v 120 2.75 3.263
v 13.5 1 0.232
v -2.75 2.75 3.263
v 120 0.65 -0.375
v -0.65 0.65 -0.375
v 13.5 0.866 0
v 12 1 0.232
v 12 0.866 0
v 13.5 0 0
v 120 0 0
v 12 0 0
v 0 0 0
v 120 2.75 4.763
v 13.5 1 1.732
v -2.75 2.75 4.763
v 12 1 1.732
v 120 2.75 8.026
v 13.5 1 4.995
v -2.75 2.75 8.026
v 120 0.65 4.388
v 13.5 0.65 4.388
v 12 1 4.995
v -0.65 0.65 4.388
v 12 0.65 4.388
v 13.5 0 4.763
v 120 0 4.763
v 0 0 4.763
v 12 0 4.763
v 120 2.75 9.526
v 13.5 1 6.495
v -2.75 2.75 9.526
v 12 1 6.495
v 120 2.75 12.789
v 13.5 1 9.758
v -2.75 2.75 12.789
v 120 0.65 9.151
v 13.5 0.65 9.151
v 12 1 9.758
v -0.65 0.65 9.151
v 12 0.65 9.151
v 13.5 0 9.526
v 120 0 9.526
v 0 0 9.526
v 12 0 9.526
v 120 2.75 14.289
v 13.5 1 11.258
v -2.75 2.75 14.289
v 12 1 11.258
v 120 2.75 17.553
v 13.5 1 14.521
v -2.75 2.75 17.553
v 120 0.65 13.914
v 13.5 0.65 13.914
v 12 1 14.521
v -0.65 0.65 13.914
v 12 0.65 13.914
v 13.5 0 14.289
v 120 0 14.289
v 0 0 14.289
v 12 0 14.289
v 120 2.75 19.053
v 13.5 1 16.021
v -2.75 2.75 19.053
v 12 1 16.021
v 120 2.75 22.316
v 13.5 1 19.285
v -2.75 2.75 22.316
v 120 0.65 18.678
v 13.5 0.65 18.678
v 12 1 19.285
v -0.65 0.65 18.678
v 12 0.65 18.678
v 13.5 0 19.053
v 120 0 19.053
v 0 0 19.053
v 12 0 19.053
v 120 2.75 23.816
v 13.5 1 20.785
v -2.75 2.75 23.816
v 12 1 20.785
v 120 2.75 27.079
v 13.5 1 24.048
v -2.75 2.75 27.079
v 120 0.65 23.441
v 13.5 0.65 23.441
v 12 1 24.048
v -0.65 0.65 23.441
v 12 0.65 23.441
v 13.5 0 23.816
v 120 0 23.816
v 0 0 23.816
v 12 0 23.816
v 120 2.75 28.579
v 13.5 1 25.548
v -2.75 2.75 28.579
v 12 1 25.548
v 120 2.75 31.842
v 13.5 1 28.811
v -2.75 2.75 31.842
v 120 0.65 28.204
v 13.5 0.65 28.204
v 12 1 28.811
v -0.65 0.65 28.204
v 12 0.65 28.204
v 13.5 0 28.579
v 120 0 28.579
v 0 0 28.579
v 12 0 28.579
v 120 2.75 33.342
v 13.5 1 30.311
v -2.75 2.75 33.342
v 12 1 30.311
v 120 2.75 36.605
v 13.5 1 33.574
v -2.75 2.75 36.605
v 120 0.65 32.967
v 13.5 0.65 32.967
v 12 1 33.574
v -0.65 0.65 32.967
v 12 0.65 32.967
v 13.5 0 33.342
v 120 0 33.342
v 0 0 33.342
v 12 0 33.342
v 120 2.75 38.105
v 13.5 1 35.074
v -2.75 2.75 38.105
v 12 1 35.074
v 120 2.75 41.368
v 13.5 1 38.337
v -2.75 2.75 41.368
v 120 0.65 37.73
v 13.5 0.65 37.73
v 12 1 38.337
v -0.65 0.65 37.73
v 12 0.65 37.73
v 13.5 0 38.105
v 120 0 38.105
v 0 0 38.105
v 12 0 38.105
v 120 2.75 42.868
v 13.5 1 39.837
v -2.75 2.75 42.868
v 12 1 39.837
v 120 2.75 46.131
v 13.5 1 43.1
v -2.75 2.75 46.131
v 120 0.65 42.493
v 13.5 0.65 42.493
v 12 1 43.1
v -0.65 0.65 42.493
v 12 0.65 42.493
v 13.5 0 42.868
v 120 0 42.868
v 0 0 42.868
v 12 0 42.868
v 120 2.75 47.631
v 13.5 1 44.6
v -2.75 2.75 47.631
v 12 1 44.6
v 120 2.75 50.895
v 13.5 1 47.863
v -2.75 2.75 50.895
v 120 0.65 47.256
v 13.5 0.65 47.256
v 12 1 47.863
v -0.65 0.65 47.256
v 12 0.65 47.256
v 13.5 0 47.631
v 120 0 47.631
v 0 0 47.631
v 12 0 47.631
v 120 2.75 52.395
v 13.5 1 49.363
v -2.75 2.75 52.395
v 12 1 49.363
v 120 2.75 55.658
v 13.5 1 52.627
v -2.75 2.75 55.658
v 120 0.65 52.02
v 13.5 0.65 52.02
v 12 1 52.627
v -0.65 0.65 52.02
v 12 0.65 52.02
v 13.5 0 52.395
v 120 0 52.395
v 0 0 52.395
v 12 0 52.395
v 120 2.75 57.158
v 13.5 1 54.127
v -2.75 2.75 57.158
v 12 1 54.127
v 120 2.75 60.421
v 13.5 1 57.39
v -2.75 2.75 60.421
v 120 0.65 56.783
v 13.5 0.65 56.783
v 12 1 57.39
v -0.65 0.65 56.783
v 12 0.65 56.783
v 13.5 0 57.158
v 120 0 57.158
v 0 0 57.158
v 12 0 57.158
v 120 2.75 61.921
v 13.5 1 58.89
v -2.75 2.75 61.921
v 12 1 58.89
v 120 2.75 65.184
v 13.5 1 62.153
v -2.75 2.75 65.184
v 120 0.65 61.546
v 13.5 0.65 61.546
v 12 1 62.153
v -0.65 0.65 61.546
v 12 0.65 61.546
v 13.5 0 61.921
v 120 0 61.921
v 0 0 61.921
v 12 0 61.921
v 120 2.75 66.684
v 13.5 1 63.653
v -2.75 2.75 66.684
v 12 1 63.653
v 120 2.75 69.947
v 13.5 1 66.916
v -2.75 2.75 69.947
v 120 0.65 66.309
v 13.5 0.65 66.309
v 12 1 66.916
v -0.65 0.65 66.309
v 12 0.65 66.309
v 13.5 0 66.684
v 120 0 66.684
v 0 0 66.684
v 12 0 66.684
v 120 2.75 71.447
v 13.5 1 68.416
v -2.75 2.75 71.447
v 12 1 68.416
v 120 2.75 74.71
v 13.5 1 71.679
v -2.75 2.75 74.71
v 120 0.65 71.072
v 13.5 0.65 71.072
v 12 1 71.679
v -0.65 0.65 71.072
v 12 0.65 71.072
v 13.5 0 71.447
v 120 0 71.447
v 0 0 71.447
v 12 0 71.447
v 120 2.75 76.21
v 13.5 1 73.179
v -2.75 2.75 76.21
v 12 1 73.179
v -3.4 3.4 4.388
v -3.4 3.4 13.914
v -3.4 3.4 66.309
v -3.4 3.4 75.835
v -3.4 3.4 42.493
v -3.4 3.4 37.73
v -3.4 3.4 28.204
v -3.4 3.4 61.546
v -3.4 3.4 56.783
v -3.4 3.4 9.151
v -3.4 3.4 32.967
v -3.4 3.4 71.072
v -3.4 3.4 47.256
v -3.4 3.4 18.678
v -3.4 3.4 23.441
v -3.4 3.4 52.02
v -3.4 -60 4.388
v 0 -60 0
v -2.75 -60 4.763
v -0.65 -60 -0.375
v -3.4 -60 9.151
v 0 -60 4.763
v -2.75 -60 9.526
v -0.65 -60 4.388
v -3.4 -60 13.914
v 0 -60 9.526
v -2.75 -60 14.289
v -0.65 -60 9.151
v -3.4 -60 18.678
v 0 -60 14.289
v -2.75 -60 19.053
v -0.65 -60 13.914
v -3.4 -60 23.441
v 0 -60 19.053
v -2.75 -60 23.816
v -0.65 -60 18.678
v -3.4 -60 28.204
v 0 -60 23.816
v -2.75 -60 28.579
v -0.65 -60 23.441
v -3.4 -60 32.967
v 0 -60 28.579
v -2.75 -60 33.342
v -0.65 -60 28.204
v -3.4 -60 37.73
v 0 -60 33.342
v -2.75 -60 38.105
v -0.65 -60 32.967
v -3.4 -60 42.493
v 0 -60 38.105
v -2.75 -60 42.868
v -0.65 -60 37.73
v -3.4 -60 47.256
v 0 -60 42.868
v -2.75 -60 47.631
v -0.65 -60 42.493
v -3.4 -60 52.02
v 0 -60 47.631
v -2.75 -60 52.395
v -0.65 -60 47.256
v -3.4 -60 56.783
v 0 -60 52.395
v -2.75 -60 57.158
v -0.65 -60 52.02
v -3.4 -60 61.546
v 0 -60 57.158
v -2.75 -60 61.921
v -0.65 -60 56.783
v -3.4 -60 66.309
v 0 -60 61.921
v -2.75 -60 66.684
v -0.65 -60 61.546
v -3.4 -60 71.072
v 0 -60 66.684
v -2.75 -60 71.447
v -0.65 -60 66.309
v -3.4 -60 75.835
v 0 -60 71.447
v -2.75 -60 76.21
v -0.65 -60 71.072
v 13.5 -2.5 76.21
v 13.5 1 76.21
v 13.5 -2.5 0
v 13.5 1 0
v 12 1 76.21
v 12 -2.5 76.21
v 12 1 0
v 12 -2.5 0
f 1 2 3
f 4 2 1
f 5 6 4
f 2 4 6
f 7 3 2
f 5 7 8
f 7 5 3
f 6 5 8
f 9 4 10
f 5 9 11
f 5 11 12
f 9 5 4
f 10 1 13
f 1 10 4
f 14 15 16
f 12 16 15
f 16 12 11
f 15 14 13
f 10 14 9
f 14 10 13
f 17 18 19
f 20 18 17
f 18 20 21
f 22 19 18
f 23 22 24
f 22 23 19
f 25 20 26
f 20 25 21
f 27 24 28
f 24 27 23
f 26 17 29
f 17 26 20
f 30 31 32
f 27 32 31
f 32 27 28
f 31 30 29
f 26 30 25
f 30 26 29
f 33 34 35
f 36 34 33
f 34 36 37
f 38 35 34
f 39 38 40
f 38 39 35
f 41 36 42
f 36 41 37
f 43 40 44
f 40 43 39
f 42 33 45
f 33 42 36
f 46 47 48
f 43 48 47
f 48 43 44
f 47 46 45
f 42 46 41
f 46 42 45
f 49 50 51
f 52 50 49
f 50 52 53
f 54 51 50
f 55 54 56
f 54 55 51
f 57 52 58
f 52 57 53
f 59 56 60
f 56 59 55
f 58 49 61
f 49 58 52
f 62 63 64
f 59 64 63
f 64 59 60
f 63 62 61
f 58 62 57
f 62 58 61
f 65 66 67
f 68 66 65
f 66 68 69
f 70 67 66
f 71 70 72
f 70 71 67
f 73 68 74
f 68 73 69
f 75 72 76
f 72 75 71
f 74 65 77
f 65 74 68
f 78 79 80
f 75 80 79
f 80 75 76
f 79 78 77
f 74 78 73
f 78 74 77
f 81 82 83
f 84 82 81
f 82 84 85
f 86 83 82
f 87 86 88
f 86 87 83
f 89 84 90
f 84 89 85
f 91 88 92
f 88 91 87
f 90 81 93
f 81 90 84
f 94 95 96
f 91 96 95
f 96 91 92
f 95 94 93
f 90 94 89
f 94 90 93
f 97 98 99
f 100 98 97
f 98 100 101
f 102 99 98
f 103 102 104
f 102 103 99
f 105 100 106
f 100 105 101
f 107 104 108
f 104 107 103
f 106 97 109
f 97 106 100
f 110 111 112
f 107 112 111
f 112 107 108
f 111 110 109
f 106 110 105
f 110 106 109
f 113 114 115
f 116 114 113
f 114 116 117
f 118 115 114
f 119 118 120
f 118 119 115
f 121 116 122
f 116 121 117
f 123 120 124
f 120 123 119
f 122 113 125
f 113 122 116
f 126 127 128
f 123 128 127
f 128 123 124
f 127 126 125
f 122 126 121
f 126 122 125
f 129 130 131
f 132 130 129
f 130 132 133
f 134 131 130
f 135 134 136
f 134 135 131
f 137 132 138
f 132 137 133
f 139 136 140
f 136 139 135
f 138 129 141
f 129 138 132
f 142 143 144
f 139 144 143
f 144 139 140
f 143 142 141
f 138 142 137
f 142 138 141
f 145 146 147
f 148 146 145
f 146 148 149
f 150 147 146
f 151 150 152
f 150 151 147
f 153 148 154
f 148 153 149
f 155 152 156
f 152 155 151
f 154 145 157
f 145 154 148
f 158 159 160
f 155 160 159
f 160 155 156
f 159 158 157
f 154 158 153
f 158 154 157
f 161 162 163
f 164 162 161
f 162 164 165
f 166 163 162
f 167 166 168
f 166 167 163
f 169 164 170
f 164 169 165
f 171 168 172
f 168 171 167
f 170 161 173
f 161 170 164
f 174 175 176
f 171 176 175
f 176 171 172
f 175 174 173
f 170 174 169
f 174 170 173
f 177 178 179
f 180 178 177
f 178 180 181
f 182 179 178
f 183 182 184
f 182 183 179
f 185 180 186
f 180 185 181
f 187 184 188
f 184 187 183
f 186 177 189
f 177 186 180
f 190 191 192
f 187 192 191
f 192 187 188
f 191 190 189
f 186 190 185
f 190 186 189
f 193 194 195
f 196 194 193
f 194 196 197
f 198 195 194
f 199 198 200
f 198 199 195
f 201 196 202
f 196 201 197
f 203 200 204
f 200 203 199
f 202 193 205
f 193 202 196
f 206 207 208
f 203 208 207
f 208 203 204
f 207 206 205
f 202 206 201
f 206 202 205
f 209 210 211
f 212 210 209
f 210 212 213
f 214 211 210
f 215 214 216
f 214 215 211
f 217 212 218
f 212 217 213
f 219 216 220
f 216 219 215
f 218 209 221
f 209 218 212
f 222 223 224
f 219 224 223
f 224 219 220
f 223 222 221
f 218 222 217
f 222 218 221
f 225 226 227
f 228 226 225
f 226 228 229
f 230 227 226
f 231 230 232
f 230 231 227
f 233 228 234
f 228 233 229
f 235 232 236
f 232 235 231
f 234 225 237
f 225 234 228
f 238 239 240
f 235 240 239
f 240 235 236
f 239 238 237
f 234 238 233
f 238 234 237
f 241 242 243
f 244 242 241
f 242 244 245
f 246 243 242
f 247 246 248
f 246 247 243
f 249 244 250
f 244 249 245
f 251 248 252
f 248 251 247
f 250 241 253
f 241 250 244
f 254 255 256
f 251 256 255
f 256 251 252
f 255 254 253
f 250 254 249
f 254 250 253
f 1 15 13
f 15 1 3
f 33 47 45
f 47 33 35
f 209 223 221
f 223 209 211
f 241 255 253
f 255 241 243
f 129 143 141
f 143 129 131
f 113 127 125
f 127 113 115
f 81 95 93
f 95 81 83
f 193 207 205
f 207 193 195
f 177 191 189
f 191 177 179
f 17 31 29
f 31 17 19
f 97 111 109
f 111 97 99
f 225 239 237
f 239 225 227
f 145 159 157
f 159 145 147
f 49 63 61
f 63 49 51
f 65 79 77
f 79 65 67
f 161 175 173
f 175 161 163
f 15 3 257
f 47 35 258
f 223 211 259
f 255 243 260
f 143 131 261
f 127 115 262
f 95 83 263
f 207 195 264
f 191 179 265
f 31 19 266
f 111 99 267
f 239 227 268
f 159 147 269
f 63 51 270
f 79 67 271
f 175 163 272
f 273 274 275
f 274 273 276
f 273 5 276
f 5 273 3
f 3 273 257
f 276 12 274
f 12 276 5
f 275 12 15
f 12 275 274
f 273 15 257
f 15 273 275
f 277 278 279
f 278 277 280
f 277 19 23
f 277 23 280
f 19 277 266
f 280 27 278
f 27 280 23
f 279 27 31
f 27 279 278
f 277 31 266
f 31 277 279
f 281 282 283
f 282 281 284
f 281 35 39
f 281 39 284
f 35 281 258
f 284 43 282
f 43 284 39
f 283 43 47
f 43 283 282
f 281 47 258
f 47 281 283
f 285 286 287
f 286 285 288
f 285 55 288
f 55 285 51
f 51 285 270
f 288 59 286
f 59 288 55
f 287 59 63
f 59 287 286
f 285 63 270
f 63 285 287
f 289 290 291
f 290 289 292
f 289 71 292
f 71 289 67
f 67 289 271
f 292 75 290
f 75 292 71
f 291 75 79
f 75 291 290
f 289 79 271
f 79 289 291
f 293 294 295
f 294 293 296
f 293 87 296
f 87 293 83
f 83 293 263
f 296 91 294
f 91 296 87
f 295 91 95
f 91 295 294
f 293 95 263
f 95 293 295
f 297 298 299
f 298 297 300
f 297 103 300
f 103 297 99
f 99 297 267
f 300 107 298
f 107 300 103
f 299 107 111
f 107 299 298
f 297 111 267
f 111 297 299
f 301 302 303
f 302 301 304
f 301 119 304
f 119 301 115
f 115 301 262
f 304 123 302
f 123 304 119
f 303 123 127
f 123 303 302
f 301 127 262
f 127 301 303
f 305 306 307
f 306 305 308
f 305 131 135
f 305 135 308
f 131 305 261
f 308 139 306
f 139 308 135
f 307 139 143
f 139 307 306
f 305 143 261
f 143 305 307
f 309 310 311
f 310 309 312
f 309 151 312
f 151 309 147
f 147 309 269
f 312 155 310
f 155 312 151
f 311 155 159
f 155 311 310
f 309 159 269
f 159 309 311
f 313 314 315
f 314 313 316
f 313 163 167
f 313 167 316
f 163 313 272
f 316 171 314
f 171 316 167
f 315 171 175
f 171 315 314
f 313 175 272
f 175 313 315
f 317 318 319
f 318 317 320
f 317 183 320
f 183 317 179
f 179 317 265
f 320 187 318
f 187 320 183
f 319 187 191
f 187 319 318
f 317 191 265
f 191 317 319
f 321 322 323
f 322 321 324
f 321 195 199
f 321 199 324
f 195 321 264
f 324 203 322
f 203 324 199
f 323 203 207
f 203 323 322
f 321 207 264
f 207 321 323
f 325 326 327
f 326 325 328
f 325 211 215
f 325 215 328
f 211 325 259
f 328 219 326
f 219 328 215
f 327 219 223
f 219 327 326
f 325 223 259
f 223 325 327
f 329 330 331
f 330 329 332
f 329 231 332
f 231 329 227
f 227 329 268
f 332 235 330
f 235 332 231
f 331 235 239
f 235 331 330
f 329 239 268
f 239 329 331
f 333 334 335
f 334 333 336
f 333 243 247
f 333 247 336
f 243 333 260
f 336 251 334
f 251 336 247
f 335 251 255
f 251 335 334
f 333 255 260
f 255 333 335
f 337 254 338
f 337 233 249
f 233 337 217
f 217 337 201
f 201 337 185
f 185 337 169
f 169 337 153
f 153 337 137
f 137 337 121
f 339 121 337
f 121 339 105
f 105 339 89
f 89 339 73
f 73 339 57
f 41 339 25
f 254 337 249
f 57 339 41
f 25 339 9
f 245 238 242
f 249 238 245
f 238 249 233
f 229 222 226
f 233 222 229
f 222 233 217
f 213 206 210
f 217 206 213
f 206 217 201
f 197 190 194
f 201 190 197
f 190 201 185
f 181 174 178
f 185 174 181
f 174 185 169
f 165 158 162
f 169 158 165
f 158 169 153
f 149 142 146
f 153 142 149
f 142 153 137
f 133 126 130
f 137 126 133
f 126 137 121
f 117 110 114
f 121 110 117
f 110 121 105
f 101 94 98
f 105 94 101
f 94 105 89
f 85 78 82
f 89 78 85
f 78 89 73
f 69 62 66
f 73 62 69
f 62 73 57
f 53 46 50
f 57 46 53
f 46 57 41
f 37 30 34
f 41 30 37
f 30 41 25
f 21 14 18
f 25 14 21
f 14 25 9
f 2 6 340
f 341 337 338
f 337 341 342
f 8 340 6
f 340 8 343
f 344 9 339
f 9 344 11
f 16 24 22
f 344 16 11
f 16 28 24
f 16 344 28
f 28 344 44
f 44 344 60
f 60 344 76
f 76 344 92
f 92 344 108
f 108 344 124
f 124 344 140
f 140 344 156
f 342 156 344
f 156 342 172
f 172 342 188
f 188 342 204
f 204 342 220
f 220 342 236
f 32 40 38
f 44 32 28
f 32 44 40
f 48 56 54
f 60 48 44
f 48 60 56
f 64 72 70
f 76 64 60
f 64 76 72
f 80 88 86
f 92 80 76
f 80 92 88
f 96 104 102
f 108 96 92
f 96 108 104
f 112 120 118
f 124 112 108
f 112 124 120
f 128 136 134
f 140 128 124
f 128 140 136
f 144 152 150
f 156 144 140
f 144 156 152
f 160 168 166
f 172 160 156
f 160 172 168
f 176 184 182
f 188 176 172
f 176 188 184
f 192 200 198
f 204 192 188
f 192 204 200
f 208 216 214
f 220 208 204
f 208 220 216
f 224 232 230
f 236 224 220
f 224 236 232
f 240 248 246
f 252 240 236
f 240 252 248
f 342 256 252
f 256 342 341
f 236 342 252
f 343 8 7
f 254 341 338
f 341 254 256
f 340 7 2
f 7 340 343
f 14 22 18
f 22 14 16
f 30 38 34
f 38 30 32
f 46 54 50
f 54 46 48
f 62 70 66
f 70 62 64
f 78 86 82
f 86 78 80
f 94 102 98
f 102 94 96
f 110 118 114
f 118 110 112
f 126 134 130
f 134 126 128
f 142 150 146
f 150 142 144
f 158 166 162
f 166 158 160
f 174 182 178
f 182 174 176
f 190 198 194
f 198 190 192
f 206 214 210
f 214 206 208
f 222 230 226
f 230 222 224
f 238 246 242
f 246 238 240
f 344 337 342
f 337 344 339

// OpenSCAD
// file: math.scad
function sum( v, i = 0) = i < len( v) ? v[ i] + sum( v, i + 1) : 0;

function vector_sum( v, i = 0) = i < len( v) - 1 ? let( w = vector_sum( v, i + 1)) [ for ( j = [ 0: len( w) - 1]) v[ i][ j] + w[ j]] : v[ i];
function vector_difference( a, b) = [ for ( i = [ 0: len( a) - 1]) a[ i] - b[ i]];
function vector_length( v) = sqrt( sum( [ for ( i = v) i * i]));
function vector_scale( v, x) = [ for ( i = v) i * x];

function normalize_angle( a) =
        a < -180
        ? normalize_angle( a + 360)
        : ( a > 180
            ? normalize_angle( a - 360)
            : a);

function polar_to_vector( a, m) =
        [ cos( a) * m, sin( a) * m];

function vector_to_angle( v) = atan2( v[ 1], v[ 0]);
function vector_to_polar( v) = [ vector_to_angle( v), vector_length( v)];
// main file
use <math.scad>;

$fn = 12;

function _echo(x,s) = [x, search([str(s)], [])][0];
function _assert(m,x,v) = x?v:_echo(v, str(m));
function _value(n,v) = _echo(v, str(n,"=",v));
function _func(n,a) = _echo(undef, str(n,"(",_args(a),")"));
function _args(a,i=0,s="") = i>=len(a)?s:_args(a,i+2,i==0?str(a[0],"=",a[1]):str(s,", ",a[i],"=",a[i+1]));

e = exp(1);

function feet(ft,in=0) = inches(ft*12+in);
function inches(in) = in;

//function slat_thickness() = inches(1.5);
function slat_thickness() = inches(.75);
function slat_width() = inches(5.5);
function slat_skew() = inches(0);
function post_width() = inches(3.5);
function post_thickness() = inches(1.5);
function slat_angle() = asin((post_width()-slat_thickness())/slat_width());
function slat_height() = slat_width()*cos(slat_angle());
function slat_gap() = -inches(0);
function walnut() = [0.247, 0.165, 0.078];

function target_height() = feet(6);
function slat_count() = ceil(target_height()/slat_offset());
function slat_offset() = slat_gap()+slat_height()-slat_skew();
function height() = slat_count()*slat_offset();

module slat(length) {
    thickness = slat_thickness();
    width = slat_width();
    skew = slat_skew();
    face_height = width-skew;
    color(walnut())
    rotate([90,slat_angle(),90])
    linear_extrude(length) {
        polygon([[0, 0],
                 [0, face_height],
                 [thickness, width],
                 [thickness, skew]]);
    }
}

module fence(length) {
    for (i=[0:slat_count()-1]) {
        translate([0,0,slat_gap()+i*slat_offset()]) {
            slat(length);
        }
    }
}

difference() {
    offset = post_width();
    translate([-offset,0,0]) {
        fence(feet(10)+offset);
    }
    translate([-feet(1),post_width()-inches(.75),0]) {
        color(walnut()) cube([feet(12),inches(3),feet(7)]);
    }
    translate([0,0,-inches(1)]) {
        linear_extrude(height()+inches(2)) {
            polygon([[-offset-inches(1),offset+inches(1)],
                    [offset+inches(1),-offset-inches(1)],
                    [-offset-inches(1),-offset-inches(1)]]);
        }
    }
}

difference() {
    offset = post_width();
    translate([0,-feet(5),0]) {
        rotate([0,0,90]) {
            fence(feet(5)+offset);
        }
    }
    translate([0,0,-inches(1)]) {
        linear_extrude(height()+inches(2)) {
            polygon([[-offset-inches(1),offset+inches(1)],
                    [offset+inches(1),-offset-inches(1)],
                    [offset+inches(1),offset+inches(1)]]);
        }
    }
}

translate([inches(12),-post_width()+inches(1),0]) {
    color(walnut())
    cube([post_thickness(), post_width(), height()]);
}


*translate([-post_width(),0,0]) {
    color(walnut())
    cube([post_width(), post_width(), height()]);
}

*translate([-post_width(),-feet(5),0]) {
    color(walnut())
    cube([post_width(), post_width(), height()]);
}

echo(height_feet=(height())/feet(1));
